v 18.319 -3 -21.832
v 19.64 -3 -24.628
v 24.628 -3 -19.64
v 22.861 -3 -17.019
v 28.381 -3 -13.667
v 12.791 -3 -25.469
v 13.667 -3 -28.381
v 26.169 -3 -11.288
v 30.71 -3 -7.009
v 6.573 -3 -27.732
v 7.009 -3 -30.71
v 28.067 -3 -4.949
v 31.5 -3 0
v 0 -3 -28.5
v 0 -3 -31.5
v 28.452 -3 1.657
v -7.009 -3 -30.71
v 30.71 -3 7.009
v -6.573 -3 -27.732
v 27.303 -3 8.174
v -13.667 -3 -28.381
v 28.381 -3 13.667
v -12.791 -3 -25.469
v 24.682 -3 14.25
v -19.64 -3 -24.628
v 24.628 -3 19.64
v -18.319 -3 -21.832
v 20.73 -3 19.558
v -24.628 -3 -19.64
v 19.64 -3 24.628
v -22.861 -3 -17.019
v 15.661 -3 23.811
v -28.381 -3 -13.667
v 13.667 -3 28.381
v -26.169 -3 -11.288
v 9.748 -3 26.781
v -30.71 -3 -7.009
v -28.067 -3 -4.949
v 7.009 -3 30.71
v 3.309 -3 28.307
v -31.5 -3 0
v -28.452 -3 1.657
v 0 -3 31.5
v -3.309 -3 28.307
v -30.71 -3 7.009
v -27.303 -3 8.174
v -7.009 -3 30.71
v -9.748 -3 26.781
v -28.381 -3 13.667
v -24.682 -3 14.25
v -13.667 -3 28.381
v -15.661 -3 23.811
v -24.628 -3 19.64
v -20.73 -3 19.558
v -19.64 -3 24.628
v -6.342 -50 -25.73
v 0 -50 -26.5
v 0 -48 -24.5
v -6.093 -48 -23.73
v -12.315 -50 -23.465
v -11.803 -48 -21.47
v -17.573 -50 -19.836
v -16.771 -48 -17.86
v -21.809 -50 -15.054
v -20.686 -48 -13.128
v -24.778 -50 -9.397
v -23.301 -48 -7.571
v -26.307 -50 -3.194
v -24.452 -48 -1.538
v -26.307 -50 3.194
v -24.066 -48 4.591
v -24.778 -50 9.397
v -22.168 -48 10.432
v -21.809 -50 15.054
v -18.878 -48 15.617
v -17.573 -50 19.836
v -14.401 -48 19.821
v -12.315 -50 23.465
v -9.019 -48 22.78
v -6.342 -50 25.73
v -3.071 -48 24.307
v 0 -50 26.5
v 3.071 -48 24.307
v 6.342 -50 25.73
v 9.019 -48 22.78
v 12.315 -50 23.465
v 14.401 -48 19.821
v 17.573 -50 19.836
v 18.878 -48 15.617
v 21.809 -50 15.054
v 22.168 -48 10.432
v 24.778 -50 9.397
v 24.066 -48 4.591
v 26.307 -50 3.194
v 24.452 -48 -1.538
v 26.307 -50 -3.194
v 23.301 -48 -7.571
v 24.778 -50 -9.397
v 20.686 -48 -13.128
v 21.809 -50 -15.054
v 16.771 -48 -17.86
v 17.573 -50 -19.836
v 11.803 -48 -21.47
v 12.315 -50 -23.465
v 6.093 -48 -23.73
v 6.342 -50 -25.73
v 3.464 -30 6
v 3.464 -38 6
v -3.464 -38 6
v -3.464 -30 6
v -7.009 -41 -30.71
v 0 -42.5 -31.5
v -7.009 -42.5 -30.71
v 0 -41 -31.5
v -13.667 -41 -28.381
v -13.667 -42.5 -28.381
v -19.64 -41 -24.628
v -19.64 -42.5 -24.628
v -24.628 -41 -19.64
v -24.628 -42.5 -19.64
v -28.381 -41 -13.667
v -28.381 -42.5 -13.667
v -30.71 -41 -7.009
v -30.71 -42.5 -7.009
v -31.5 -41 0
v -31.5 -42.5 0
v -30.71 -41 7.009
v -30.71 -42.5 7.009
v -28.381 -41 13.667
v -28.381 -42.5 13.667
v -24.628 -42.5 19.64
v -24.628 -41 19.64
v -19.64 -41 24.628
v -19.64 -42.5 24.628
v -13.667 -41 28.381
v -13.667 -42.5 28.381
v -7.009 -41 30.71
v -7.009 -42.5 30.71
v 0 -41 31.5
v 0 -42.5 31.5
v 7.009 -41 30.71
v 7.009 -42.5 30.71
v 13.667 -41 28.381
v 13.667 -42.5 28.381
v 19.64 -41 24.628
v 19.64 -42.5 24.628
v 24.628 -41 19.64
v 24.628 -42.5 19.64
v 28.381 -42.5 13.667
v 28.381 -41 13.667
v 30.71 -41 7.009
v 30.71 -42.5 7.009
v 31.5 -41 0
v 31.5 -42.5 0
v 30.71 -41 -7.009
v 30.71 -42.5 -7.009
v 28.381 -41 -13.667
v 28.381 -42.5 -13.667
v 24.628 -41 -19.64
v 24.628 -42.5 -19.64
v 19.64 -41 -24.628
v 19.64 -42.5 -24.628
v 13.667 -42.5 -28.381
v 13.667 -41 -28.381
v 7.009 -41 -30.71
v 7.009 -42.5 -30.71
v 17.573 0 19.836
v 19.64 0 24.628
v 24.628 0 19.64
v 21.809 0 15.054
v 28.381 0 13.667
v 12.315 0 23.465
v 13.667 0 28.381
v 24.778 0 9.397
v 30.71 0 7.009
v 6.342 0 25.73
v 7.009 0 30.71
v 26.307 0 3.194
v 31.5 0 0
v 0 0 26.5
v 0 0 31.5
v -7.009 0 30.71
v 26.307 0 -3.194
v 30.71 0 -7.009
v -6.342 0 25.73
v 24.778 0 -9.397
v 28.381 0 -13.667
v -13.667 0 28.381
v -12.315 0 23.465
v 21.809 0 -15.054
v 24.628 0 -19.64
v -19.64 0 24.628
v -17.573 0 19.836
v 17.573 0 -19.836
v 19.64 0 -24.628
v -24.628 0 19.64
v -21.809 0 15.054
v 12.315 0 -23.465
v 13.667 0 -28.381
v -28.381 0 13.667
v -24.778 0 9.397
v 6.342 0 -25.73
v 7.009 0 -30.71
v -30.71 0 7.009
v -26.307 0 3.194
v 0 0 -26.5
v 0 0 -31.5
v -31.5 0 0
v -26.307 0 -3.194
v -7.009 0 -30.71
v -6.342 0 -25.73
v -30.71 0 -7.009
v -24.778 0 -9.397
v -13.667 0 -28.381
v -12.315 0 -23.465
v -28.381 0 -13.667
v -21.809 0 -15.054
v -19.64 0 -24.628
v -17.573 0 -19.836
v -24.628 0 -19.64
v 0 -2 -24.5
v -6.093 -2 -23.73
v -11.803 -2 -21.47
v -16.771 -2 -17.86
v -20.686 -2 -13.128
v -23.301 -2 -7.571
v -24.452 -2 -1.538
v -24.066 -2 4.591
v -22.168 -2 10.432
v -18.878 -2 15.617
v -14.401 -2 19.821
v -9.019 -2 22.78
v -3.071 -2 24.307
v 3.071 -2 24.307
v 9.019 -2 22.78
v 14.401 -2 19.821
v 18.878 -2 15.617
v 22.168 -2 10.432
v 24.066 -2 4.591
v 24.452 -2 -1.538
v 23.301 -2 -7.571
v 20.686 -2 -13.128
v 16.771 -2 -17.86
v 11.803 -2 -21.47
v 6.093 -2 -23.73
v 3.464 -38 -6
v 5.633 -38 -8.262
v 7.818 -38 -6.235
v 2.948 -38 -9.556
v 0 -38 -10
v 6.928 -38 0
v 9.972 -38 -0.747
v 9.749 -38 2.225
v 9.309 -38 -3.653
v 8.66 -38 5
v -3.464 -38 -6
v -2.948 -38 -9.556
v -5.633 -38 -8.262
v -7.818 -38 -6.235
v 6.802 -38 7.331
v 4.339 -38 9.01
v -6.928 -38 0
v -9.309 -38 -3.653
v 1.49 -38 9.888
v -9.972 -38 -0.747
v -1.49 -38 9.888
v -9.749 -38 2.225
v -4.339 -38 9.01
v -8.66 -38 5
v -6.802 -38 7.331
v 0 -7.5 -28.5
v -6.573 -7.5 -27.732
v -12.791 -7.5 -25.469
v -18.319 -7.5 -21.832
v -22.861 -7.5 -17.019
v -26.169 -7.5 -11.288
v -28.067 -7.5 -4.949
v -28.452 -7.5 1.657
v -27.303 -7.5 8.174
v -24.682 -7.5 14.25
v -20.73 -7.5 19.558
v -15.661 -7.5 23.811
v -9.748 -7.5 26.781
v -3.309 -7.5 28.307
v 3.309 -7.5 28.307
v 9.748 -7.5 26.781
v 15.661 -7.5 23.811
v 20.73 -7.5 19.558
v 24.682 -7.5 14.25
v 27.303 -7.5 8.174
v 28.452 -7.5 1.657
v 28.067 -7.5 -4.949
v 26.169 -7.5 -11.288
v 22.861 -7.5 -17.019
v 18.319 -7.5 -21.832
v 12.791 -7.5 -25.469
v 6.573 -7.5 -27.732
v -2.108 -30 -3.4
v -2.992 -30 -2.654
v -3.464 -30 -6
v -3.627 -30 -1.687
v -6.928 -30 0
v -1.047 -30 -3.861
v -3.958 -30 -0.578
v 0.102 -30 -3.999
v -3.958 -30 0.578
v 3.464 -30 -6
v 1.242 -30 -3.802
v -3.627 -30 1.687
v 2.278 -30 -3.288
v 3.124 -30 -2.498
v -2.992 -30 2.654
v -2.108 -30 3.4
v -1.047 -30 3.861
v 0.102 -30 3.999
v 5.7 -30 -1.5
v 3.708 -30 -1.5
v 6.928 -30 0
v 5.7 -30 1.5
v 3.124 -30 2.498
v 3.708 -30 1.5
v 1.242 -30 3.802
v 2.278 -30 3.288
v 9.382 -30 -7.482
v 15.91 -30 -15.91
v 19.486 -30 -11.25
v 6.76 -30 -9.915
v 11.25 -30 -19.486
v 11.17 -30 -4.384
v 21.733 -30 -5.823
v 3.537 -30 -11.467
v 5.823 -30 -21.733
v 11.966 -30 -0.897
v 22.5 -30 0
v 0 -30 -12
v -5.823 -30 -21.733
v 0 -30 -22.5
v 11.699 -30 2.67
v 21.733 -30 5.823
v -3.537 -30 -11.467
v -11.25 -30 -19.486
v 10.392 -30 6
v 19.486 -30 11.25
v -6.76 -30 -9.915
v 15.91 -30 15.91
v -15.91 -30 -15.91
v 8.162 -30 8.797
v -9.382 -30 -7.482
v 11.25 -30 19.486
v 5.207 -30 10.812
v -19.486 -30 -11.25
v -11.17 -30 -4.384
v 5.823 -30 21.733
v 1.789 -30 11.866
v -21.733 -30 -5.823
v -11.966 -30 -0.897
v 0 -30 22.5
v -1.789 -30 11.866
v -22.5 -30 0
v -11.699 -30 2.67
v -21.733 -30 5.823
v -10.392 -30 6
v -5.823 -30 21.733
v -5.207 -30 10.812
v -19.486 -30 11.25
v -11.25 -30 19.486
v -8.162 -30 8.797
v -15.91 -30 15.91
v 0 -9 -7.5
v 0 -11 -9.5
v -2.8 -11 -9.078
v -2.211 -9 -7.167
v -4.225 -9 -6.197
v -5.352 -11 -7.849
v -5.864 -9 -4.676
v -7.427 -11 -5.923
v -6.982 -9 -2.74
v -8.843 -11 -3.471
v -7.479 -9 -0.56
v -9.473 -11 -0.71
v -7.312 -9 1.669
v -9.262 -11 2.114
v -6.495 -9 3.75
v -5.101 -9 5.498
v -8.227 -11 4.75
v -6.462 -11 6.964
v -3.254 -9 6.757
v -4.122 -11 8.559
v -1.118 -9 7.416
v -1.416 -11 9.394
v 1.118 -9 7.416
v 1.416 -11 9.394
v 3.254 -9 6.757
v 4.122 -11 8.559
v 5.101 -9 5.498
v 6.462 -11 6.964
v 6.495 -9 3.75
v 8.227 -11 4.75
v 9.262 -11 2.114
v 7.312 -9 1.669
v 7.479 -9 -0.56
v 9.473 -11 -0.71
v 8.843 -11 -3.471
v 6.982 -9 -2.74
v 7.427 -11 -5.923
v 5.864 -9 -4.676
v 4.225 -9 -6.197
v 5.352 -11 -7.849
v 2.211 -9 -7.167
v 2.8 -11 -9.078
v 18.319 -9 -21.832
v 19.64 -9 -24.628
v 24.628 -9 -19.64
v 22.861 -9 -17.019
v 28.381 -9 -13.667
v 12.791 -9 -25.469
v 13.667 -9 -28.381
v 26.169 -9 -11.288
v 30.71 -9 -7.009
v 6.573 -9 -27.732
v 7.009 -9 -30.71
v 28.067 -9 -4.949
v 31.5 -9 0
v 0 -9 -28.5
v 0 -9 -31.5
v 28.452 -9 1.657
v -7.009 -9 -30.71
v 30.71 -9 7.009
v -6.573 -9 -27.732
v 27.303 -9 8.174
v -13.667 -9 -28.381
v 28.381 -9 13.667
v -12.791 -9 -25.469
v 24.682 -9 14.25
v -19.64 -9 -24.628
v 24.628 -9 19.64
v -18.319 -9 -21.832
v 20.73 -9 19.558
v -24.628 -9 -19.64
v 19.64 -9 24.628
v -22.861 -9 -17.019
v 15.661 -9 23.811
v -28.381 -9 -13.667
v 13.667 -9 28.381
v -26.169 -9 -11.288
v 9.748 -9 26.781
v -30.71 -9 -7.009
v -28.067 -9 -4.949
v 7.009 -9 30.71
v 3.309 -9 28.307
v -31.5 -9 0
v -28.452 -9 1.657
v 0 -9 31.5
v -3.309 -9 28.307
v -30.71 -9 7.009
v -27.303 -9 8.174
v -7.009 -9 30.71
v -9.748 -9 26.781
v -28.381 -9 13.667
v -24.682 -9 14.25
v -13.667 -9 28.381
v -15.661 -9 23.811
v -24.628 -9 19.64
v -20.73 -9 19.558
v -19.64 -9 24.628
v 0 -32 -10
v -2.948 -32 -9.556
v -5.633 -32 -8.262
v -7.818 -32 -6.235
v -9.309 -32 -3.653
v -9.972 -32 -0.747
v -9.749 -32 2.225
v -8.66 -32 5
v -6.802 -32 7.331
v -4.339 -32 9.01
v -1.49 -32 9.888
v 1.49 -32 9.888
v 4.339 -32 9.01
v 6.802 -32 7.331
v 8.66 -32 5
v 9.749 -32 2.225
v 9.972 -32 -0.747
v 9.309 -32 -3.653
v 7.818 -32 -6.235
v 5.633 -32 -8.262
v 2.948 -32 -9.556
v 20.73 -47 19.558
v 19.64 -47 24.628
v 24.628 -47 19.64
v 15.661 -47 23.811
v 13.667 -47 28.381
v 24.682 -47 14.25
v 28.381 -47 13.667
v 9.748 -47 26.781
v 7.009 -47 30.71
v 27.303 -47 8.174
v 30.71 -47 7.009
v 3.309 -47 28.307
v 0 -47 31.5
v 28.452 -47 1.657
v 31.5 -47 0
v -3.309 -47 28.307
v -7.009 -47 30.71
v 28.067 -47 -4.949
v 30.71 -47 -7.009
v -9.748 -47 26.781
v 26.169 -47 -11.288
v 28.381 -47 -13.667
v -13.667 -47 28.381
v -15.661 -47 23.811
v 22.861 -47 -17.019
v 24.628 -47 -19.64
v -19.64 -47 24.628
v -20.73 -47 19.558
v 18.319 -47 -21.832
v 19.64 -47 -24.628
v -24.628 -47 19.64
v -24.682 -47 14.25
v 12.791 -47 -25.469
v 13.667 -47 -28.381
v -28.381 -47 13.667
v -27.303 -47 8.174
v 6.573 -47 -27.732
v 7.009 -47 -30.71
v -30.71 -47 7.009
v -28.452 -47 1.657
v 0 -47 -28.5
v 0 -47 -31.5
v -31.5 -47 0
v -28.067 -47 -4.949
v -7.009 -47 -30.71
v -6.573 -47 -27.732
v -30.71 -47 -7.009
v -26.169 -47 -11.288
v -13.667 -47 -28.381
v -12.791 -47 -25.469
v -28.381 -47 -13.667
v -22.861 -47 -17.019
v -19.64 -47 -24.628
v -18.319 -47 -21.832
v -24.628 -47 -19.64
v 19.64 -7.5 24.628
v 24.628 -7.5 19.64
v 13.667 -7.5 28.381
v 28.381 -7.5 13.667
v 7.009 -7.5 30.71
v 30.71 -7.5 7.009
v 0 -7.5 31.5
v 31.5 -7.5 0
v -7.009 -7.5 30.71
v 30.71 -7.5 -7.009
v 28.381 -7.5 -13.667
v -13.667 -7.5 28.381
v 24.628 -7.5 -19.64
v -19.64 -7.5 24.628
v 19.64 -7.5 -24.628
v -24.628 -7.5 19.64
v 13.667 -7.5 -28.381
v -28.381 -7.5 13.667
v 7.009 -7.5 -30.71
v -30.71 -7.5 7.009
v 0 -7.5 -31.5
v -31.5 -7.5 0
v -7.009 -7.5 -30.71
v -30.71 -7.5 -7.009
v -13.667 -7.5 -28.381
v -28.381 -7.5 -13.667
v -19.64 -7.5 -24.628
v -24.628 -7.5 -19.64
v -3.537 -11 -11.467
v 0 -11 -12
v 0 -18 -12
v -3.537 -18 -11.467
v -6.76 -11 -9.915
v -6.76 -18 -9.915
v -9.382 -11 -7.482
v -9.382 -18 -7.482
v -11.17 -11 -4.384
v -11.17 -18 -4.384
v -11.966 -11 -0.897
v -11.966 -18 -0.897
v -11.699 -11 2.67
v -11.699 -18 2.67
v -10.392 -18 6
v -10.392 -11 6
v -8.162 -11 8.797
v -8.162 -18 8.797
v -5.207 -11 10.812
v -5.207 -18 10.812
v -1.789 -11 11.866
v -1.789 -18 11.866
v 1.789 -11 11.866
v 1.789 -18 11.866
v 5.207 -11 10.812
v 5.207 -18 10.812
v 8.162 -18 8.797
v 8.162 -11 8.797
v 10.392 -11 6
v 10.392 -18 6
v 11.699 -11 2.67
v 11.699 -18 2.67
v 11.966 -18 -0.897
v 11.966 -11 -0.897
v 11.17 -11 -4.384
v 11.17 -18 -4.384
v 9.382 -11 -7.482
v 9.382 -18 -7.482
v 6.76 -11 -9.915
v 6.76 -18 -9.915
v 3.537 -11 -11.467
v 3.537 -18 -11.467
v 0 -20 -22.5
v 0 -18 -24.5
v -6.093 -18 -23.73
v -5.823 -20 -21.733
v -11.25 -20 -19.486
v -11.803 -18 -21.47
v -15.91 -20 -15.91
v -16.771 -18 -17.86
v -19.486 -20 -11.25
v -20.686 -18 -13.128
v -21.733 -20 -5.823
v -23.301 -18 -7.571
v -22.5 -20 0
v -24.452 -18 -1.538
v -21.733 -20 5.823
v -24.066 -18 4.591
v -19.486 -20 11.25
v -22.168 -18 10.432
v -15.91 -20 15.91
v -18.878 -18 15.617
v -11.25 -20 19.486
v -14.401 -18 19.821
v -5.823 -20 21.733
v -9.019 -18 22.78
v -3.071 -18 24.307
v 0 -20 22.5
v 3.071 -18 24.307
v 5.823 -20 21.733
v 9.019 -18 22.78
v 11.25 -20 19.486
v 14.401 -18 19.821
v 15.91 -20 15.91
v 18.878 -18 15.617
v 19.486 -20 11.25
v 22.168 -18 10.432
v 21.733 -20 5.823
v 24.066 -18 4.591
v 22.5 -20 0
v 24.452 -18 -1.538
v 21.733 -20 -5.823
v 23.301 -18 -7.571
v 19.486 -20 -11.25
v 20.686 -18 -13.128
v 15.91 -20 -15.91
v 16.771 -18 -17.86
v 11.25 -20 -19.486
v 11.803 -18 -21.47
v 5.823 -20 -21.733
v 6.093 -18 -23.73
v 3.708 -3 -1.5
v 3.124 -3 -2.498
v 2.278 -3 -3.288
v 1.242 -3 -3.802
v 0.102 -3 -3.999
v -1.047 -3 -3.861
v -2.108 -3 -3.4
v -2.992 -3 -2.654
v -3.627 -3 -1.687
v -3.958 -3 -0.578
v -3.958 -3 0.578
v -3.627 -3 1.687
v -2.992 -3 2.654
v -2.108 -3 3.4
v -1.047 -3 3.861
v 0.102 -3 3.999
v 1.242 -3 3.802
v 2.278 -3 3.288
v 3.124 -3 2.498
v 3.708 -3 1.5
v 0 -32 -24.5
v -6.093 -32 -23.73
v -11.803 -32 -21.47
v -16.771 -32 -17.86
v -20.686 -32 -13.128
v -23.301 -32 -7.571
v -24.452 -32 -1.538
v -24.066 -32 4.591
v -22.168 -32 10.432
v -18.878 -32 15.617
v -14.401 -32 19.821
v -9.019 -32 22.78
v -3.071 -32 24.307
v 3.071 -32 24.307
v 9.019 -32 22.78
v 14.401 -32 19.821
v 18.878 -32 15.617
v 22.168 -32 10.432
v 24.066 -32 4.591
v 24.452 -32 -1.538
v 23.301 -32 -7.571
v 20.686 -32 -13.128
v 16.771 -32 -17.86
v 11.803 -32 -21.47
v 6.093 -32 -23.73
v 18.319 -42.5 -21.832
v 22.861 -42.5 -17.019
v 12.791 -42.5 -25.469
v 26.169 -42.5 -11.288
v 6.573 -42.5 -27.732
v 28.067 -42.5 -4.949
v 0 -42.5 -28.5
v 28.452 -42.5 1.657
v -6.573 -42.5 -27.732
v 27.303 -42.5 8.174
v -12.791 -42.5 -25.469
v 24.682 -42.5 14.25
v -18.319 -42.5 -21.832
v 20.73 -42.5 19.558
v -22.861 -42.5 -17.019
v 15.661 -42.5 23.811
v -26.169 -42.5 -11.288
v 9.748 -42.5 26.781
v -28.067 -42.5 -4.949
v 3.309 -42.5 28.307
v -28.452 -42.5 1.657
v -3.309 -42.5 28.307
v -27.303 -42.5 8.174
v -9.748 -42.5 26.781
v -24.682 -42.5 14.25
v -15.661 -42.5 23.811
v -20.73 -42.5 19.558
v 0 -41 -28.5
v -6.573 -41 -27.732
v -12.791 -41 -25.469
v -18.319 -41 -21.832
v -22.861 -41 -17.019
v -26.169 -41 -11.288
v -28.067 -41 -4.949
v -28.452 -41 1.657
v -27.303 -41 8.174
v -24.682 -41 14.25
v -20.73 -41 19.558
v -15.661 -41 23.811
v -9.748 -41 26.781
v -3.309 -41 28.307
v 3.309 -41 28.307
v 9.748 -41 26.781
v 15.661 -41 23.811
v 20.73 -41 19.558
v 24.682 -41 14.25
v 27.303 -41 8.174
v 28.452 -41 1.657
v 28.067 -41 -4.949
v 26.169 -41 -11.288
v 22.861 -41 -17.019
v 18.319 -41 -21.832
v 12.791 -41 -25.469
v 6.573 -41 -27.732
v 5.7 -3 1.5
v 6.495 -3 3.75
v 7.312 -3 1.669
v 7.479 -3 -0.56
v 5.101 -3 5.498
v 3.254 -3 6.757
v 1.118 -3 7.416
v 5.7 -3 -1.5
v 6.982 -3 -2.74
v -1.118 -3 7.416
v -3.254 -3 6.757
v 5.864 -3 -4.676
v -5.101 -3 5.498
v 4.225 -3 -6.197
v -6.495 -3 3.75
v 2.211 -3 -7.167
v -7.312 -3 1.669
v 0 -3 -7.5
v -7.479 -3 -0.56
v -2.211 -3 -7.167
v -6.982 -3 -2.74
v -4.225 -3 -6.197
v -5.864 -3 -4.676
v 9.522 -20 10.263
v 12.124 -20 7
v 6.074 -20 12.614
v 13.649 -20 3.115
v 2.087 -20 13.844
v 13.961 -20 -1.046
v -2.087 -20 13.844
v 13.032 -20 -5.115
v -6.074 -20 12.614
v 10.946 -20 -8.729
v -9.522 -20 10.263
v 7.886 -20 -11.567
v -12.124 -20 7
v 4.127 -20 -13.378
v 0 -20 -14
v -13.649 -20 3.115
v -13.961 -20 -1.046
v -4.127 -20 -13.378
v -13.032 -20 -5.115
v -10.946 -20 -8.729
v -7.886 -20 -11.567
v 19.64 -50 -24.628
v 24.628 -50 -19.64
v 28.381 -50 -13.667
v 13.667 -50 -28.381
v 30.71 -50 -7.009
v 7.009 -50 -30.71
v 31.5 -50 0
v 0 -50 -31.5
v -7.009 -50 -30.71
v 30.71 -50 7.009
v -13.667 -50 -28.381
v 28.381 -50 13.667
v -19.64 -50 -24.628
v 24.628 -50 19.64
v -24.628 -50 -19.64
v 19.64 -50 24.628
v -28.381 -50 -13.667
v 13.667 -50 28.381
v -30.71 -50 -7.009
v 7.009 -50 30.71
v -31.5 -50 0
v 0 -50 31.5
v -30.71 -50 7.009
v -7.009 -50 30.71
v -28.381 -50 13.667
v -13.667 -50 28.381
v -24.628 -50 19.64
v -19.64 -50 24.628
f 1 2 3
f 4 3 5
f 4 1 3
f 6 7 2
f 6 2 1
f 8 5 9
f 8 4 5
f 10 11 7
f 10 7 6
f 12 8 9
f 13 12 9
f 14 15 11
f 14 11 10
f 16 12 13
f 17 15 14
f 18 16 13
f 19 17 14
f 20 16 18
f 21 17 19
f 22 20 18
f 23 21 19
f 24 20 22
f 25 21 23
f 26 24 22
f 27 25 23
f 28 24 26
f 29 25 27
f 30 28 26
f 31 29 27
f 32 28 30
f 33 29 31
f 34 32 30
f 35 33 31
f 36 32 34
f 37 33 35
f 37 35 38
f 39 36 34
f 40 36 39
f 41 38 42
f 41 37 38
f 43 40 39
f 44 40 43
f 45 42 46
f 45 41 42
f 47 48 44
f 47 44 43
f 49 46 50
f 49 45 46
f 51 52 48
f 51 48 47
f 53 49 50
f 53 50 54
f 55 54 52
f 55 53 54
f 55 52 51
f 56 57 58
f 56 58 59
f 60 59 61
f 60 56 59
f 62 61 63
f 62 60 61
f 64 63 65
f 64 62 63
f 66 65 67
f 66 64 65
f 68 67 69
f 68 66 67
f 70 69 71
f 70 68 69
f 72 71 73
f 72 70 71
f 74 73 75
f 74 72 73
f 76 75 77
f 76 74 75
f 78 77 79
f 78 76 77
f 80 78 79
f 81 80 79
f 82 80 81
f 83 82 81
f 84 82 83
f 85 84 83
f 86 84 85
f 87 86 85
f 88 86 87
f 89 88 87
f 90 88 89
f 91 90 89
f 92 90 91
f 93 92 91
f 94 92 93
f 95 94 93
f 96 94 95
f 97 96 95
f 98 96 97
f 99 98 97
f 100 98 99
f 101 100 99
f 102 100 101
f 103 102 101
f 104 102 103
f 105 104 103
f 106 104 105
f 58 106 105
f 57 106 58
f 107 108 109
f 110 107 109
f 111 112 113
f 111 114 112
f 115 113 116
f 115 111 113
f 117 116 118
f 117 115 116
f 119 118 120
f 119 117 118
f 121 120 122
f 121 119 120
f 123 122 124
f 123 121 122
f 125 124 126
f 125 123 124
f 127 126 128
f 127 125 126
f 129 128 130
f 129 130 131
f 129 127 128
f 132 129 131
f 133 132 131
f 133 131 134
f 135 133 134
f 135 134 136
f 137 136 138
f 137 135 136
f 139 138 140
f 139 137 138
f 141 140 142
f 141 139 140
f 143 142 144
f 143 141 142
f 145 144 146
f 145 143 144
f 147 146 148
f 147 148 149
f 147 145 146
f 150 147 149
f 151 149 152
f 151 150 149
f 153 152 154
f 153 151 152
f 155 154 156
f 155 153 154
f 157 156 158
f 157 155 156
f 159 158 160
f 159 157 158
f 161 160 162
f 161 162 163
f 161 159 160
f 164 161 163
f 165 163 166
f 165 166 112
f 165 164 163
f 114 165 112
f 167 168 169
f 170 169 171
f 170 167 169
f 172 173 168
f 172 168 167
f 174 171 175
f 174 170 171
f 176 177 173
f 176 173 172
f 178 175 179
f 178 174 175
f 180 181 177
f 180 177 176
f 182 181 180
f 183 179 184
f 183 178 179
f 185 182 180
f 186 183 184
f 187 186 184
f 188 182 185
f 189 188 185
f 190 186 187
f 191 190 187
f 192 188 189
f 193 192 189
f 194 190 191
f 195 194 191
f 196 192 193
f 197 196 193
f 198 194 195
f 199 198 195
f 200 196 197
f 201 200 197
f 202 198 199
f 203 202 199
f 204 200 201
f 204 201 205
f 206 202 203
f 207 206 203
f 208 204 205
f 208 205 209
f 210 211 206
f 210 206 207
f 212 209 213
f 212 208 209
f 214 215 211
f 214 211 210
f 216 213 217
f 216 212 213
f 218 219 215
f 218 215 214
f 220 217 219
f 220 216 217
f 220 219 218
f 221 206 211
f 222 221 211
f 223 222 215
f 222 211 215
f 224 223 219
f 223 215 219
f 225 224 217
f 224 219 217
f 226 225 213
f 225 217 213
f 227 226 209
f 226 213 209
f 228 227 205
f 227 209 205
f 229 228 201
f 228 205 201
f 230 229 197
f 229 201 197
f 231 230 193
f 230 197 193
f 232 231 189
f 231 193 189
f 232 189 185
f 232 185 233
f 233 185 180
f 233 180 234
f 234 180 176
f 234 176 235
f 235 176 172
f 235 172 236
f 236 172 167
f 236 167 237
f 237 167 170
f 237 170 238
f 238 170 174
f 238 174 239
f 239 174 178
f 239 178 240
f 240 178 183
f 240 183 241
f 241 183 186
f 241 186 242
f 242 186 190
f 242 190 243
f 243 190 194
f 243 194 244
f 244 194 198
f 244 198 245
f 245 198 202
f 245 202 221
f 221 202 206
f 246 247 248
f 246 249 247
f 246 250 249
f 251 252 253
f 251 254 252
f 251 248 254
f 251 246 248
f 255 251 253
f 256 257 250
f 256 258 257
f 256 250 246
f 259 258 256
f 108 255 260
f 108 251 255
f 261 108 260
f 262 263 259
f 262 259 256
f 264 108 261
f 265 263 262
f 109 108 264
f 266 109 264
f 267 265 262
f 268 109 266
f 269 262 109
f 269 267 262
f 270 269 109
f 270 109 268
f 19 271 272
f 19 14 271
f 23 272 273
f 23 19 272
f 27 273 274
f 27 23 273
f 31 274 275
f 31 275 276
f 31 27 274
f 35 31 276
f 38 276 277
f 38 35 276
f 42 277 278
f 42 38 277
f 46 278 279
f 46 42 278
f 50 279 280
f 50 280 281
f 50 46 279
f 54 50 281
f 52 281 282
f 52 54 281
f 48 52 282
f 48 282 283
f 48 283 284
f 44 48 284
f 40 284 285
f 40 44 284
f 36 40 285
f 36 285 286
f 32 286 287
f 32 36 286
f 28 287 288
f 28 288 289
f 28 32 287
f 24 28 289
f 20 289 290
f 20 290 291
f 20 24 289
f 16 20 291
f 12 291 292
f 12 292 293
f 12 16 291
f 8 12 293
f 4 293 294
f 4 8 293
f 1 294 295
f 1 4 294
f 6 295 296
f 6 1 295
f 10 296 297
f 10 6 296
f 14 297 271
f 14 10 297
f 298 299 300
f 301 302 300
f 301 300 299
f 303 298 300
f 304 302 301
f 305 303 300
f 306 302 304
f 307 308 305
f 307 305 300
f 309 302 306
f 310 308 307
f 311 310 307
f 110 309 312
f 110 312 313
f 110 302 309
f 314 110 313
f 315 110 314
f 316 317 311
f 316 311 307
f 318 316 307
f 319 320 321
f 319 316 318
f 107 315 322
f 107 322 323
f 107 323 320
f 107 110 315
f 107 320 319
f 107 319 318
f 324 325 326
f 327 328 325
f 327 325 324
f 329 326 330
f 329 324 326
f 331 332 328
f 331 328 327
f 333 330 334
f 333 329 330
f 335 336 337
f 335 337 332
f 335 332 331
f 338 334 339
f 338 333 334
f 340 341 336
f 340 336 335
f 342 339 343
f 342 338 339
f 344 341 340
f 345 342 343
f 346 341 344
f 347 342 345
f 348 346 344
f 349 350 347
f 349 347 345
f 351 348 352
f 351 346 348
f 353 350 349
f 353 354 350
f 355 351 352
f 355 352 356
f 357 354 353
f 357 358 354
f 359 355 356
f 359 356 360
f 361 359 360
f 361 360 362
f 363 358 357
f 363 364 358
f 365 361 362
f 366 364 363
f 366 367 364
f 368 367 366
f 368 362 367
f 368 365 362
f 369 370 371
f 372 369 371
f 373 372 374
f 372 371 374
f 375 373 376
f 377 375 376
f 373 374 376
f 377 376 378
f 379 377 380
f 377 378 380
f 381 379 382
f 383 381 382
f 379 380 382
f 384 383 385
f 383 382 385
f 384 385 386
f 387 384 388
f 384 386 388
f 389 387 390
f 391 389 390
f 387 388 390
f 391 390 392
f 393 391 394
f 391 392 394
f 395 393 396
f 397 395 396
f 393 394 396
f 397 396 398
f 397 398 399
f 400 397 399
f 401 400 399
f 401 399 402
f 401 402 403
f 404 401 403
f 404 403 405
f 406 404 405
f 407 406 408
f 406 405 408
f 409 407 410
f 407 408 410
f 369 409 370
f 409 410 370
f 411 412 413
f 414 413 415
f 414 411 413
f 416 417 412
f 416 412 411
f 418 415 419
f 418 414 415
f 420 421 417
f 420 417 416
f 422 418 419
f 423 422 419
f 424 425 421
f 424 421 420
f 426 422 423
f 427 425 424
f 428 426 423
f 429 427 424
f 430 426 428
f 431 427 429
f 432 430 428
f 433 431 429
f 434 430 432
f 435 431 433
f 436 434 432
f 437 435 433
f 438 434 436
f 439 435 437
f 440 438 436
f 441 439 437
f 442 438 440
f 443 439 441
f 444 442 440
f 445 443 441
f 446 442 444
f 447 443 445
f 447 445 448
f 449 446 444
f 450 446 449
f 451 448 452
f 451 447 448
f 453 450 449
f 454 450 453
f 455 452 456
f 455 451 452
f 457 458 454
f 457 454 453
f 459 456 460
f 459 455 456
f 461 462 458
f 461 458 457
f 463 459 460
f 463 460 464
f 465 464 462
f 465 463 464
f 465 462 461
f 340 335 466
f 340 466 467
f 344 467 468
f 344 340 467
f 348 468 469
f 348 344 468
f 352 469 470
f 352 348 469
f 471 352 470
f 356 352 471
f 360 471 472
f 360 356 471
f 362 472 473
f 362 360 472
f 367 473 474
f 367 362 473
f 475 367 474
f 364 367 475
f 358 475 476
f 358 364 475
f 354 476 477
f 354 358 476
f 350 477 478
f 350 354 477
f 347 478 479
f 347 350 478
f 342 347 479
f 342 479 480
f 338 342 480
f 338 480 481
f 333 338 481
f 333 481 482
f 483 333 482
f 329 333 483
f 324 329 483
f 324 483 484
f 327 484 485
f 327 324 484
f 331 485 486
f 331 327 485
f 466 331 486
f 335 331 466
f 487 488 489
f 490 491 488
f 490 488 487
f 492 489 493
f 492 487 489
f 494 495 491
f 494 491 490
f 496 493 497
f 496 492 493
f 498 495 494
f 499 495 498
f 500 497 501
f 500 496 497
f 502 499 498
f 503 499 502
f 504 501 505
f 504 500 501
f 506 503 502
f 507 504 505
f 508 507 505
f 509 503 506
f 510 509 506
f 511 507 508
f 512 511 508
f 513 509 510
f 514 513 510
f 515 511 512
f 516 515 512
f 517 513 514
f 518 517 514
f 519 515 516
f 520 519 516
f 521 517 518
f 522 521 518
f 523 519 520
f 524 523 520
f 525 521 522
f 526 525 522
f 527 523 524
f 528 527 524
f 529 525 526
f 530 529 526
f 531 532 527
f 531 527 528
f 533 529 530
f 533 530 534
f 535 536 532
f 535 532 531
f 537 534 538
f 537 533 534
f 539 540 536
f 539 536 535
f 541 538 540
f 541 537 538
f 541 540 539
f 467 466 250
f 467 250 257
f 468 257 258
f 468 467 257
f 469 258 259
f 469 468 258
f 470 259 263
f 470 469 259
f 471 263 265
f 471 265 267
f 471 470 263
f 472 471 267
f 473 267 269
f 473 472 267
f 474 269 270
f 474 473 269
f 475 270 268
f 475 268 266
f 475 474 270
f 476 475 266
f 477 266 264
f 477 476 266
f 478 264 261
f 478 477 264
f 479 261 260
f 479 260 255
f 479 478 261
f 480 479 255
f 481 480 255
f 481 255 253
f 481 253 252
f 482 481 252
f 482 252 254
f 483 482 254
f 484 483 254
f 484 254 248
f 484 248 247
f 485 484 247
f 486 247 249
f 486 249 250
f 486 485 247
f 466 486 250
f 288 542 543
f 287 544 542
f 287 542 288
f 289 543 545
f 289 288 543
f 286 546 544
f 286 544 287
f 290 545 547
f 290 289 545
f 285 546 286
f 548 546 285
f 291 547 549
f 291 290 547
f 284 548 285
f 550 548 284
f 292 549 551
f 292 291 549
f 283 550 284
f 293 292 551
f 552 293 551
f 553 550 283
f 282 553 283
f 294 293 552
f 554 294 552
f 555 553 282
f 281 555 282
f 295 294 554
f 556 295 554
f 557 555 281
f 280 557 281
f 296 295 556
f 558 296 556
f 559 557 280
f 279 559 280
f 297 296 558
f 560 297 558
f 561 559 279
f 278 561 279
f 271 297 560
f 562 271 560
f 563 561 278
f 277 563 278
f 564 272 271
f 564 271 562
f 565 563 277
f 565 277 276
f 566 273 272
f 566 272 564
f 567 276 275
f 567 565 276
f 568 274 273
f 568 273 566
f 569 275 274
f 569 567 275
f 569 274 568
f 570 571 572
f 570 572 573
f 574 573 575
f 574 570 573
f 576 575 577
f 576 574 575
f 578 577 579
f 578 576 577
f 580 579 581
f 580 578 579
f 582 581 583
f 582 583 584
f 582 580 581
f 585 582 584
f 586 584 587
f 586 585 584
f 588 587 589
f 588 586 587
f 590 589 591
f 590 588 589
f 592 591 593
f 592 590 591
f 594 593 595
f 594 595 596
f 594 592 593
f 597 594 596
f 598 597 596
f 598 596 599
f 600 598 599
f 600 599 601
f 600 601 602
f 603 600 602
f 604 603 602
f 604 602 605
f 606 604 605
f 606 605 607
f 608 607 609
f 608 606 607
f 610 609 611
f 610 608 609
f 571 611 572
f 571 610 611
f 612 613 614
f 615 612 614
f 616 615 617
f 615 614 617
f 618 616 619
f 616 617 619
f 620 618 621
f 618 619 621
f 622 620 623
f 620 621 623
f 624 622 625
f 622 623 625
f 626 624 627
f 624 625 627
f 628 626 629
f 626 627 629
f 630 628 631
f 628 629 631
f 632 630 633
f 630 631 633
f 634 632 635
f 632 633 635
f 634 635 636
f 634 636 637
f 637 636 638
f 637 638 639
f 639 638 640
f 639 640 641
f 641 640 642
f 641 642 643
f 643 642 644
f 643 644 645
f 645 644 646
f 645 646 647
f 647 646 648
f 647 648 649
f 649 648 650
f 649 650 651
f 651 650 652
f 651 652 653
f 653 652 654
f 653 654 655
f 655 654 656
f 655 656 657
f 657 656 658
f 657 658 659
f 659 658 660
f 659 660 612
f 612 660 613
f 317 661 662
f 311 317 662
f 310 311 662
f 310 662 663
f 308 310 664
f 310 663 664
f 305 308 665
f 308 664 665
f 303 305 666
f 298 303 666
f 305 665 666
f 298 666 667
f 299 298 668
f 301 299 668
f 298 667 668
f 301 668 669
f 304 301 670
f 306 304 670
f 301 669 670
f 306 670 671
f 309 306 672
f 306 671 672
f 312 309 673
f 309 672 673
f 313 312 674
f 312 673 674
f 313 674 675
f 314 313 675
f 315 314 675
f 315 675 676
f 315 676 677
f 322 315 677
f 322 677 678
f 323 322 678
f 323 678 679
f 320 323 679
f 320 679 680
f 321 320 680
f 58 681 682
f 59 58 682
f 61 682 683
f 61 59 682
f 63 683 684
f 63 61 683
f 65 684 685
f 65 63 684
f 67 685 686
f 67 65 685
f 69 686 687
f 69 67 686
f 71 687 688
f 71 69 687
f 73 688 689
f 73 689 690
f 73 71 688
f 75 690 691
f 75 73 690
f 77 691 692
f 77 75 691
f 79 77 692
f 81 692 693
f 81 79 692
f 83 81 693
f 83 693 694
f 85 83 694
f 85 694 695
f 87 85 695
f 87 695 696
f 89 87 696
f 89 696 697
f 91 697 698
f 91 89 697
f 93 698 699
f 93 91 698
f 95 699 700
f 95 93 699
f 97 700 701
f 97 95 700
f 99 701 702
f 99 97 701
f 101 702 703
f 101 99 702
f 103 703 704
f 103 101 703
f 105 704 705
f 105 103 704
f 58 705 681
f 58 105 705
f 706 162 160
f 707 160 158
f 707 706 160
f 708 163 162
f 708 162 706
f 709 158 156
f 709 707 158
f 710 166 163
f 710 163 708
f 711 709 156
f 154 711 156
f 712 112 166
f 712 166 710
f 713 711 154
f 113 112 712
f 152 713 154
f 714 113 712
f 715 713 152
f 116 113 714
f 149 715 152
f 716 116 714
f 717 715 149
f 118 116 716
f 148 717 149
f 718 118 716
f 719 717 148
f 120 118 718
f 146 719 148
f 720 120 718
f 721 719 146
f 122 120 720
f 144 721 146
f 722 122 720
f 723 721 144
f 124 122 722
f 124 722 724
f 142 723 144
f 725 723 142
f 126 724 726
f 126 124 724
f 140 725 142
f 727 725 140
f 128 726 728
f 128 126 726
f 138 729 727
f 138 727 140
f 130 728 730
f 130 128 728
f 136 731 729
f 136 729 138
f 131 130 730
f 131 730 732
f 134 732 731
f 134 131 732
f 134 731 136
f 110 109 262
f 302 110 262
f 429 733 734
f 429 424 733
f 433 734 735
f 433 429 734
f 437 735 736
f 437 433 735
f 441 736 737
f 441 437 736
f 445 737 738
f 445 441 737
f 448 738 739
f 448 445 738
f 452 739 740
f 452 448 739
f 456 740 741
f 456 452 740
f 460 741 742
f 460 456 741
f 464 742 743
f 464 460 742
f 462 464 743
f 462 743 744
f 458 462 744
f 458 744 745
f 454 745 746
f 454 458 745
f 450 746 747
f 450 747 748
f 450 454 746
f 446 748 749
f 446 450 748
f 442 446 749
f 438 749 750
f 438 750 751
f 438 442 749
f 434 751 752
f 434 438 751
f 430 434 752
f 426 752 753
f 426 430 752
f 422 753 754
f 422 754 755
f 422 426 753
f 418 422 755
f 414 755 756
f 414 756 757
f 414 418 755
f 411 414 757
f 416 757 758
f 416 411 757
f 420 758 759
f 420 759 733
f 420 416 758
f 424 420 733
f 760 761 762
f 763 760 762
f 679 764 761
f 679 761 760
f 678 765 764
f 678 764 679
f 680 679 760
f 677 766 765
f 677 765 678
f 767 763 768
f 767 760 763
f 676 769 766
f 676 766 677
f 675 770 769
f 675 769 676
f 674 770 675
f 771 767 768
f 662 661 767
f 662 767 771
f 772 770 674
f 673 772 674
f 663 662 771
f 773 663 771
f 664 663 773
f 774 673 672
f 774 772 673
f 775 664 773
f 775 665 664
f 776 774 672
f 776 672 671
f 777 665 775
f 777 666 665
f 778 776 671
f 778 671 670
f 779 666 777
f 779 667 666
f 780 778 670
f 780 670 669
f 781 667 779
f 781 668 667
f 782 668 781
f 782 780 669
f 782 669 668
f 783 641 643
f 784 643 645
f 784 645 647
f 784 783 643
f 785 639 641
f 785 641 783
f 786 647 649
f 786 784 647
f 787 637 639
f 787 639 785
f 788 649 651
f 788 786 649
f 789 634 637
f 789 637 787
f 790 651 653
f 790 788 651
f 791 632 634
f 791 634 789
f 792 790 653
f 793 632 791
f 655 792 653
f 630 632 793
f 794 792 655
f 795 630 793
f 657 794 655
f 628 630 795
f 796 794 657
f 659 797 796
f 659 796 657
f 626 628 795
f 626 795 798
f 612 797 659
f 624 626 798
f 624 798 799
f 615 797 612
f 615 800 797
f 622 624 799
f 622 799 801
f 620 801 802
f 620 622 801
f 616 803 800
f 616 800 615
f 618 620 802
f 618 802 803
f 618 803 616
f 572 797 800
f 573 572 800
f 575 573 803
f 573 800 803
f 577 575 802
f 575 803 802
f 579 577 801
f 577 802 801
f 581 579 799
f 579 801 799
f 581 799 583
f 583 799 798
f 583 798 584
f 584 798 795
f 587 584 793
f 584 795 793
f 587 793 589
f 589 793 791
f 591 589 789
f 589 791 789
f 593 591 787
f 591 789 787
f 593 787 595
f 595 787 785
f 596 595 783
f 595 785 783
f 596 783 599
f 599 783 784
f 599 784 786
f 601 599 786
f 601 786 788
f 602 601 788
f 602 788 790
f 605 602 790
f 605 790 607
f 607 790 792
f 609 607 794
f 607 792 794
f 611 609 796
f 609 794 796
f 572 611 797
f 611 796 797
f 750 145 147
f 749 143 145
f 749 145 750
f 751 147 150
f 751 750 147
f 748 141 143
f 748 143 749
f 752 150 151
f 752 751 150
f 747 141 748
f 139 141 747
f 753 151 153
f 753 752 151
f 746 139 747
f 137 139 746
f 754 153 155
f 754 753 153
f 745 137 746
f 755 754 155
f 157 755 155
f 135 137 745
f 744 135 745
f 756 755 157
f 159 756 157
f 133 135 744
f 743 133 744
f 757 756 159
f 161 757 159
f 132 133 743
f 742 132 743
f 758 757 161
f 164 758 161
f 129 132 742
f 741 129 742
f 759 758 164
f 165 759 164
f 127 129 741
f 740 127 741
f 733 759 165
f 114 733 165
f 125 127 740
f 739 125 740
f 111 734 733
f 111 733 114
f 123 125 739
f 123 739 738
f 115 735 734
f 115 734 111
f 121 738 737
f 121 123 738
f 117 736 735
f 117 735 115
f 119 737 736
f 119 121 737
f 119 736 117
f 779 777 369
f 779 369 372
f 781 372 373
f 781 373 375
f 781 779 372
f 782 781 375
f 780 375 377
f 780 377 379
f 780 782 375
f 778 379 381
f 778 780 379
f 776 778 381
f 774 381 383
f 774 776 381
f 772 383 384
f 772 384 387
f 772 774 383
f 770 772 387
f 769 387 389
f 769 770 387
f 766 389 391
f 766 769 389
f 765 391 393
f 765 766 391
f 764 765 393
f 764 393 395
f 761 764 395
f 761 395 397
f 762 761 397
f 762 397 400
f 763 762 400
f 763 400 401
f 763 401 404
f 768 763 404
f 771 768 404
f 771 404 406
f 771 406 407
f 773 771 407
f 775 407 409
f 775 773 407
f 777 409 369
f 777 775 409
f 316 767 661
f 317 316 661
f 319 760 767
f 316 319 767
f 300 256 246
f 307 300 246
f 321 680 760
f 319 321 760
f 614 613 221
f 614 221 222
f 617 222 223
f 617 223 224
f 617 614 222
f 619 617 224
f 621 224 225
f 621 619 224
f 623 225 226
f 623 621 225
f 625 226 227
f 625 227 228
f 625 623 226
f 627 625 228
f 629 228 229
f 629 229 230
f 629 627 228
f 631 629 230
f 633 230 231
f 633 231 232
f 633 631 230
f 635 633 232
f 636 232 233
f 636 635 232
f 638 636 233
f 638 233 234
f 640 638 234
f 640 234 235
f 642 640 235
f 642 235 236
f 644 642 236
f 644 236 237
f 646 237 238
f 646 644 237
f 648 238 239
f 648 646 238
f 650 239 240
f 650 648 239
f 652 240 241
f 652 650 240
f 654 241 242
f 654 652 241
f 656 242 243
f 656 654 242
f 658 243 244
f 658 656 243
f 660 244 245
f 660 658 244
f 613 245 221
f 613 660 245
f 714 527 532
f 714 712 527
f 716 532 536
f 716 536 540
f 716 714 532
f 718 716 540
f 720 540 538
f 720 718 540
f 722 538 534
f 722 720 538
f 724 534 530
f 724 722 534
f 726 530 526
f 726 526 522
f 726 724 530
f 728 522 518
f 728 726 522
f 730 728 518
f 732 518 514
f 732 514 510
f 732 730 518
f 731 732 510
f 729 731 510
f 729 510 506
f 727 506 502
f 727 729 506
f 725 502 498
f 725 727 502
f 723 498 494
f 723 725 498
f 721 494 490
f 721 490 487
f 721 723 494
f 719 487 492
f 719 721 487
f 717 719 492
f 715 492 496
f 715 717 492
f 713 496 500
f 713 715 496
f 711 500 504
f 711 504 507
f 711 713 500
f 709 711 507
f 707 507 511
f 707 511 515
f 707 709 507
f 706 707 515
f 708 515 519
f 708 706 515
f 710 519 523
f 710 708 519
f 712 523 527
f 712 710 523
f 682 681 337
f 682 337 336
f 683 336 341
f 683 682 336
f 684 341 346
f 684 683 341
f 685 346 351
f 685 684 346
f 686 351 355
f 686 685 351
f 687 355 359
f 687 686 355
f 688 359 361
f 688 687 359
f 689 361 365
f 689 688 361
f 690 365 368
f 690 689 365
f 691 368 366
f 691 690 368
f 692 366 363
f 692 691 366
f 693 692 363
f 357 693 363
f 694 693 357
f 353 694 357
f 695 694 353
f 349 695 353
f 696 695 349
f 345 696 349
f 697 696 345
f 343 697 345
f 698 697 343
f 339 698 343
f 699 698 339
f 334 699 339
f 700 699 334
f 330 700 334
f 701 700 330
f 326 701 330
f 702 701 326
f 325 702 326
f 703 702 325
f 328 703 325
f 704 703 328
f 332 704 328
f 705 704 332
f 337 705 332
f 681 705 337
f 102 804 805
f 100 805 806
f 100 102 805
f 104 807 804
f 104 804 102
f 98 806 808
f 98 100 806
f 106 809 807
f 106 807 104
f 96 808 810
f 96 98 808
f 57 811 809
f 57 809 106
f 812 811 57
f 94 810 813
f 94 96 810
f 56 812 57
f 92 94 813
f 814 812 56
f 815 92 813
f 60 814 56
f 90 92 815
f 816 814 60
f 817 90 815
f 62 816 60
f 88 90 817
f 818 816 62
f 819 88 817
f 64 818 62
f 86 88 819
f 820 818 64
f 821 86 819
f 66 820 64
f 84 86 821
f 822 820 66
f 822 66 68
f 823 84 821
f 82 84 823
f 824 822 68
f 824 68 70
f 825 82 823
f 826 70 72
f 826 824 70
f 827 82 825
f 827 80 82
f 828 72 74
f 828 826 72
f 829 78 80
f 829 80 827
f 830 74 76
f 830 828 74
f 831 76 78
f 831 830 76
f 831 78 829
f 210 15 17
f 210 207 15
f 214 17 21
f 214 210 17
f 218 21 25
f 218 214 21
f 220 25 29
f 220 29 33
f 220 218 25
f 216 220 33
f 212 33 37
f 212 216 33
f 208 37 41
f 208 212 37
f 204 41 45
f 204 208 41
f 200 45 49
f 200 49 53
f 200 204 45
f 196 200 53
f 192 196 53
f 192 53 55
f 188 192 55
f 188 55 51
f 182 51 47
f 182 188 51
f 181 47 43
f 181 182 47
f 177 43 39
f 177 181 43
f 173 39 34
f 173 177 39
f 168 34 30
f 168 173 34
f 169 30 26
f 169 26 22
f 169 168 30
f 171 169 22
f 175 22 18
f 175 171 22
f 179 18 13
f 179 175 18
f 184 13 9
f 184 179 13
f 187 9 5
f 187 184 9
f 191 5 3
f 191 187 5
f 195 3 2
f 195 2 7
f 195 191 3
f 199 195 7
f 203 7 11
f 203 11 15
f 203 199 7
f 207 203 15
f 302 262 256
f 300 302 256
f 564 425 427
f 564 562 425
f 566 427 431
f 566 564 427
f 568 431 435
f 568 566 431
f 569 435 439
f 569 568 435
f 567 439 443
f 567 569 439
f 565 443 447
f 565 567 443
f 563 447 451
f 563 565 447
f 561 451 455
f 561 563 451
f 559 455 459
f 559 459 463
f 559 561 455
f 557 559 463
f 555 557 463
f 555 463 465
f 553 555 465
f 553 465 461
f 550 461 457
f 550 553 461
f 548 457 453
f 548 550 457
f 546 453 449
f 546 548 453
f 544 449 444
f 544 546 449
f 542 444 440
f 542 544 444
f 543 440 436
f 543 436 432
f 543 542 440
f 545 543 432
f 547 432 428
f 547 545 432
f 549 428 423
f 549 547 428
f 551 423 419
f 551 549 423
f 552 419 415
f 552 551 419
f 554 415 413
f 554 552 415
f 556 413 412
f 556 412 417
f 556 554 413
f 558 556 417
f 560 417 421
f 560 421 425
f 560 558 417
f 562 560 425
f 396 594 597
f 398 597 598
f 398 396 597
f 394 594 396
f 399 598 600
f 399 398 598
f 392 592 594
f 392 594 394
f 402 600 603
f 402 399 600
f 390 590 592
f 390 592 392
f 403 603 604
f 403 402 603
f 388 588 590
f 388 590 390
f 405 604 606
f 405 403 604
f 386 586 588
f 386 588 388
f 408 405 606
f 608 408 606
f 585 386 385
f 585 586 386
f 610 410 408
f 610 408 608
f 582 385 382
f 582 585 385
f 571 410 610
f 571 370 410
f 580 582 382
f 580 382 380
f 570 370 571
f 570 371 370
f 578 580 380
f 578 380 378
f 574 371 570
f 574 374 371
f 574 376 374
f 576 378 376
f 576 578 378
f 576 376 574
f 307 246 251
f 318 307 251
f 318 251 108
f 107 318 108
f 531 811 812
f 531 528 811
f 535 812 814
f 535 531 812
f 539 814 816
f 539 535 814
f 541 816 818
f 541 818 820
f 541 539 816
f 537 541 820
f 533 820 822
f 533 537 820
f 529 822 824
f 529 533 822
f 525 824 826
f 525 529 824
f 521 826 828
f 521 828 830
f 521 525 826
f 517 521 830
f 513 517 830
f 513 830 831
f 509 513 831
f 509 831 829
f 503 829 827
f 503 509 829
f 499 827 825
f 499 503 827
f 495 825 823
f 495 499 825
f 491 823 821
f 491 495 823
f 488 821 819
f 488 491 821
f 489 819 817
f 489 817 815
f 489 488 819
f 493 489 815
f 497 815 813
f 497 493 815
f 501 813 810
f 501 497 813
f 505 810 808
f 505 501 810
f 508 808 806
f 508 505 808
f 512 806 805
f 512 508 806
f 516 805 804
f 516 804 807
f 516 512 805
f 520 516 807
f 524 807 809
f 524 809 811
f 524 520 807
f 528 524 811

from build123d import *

# Parameters (mm, degrees)
CUT_EXTRUDE_1_DEPTH = 50
CUT_EXTRUDE_2_DEPTH = 8
CHAMFER_1_SIZE      = 2


with BuildPart() as part:
    # 草图1 → 旋转1 (revolve)
    with BuildSketch(Plane.XY, mode=Mode.PRIVATE) as revolve_1_sk:
        Polygon((24.5, -30), (24.5, -20), (12, -20), (12, -11), (7.5, -11), (7.5, -3), (0, -3), (0, -20), (0, -30), (0, -38), (10, -38), (10, -30), align=None)
        Polygon((31.5, 0), (24.5, 0), (24.5, -20), (24.5, -30), (28.5, -30), (28.5, -20), (28.5, -9), (31.5, -9), (31.5, -7.5), (28.5, -7.5), (28.5, -3), (31.5, -3), align=None)
        Polygon((28.5, -30), (24.5, -30), (24.5, -50), (31.5, -50), (31.5, -47), (28.5, -47), (28.5, -42.5), (31.5, -42.5), (31.5, -41), (28.5, -41), align=None)
    revolve(revolve_1_sk.sketch.rotate(Axis((0, 0, 0), (0, 1, 0)), 90), axis=Axis((0, 0, 0), (0, 1, 0)))

    # 草图2 → 切除-拉伸1 (cut)
    with BuildSketch(Plane(origin=(0, -3, 0), x_dir=(1, 0, 0), z_dir=(0, 1, 0))):
        with BuildLine():
            Line((5.7, 1.5), (3.708099244, 1.5))
            ThreePointArc((3.708099244, 1.5), (-4, 0), (3.708099244, -1.5))
            Line((3.708099244, -1.5), (5.7, -1.5))
            Line((5.7, -1.5), (5.7, 1.5))
        make_face()
    extrude(amount=-CUT_EXTRUDE_1_DEPTH, mode=Mode.SUBTRACT)

    # 草图3 → 切除-拉伸2 (cut)
    with BuildSketch(Plane.XZ.offset(38)):
        Polygon((6.92820323, 0), (3.464101615, 6), (-3.464101615, 6), (-6.92820323, 0), (-3.464101615, -6), (3.464101615, -6), align=None)
    extrude(amount=-CUT_EXTRUDE_2_DEPTH, mode=Mode.SUBTRACT)

    # 倒角1
    chamfer_1_edges = [part.edges().sort_by_distance(p)[0] for p in [
        (0, -11, 7.5),
        (0, -20, 12),
        (0, -20, 24.5),
        (0, 0, 24.5),
        (0, -50, 24.5),
        (0, -30, 24.5),
        (0, -30, 10),
    ]]
    chamfer(chamfer_1_edges, length=CHAMFER_1_SIZE)


solid = part.part
